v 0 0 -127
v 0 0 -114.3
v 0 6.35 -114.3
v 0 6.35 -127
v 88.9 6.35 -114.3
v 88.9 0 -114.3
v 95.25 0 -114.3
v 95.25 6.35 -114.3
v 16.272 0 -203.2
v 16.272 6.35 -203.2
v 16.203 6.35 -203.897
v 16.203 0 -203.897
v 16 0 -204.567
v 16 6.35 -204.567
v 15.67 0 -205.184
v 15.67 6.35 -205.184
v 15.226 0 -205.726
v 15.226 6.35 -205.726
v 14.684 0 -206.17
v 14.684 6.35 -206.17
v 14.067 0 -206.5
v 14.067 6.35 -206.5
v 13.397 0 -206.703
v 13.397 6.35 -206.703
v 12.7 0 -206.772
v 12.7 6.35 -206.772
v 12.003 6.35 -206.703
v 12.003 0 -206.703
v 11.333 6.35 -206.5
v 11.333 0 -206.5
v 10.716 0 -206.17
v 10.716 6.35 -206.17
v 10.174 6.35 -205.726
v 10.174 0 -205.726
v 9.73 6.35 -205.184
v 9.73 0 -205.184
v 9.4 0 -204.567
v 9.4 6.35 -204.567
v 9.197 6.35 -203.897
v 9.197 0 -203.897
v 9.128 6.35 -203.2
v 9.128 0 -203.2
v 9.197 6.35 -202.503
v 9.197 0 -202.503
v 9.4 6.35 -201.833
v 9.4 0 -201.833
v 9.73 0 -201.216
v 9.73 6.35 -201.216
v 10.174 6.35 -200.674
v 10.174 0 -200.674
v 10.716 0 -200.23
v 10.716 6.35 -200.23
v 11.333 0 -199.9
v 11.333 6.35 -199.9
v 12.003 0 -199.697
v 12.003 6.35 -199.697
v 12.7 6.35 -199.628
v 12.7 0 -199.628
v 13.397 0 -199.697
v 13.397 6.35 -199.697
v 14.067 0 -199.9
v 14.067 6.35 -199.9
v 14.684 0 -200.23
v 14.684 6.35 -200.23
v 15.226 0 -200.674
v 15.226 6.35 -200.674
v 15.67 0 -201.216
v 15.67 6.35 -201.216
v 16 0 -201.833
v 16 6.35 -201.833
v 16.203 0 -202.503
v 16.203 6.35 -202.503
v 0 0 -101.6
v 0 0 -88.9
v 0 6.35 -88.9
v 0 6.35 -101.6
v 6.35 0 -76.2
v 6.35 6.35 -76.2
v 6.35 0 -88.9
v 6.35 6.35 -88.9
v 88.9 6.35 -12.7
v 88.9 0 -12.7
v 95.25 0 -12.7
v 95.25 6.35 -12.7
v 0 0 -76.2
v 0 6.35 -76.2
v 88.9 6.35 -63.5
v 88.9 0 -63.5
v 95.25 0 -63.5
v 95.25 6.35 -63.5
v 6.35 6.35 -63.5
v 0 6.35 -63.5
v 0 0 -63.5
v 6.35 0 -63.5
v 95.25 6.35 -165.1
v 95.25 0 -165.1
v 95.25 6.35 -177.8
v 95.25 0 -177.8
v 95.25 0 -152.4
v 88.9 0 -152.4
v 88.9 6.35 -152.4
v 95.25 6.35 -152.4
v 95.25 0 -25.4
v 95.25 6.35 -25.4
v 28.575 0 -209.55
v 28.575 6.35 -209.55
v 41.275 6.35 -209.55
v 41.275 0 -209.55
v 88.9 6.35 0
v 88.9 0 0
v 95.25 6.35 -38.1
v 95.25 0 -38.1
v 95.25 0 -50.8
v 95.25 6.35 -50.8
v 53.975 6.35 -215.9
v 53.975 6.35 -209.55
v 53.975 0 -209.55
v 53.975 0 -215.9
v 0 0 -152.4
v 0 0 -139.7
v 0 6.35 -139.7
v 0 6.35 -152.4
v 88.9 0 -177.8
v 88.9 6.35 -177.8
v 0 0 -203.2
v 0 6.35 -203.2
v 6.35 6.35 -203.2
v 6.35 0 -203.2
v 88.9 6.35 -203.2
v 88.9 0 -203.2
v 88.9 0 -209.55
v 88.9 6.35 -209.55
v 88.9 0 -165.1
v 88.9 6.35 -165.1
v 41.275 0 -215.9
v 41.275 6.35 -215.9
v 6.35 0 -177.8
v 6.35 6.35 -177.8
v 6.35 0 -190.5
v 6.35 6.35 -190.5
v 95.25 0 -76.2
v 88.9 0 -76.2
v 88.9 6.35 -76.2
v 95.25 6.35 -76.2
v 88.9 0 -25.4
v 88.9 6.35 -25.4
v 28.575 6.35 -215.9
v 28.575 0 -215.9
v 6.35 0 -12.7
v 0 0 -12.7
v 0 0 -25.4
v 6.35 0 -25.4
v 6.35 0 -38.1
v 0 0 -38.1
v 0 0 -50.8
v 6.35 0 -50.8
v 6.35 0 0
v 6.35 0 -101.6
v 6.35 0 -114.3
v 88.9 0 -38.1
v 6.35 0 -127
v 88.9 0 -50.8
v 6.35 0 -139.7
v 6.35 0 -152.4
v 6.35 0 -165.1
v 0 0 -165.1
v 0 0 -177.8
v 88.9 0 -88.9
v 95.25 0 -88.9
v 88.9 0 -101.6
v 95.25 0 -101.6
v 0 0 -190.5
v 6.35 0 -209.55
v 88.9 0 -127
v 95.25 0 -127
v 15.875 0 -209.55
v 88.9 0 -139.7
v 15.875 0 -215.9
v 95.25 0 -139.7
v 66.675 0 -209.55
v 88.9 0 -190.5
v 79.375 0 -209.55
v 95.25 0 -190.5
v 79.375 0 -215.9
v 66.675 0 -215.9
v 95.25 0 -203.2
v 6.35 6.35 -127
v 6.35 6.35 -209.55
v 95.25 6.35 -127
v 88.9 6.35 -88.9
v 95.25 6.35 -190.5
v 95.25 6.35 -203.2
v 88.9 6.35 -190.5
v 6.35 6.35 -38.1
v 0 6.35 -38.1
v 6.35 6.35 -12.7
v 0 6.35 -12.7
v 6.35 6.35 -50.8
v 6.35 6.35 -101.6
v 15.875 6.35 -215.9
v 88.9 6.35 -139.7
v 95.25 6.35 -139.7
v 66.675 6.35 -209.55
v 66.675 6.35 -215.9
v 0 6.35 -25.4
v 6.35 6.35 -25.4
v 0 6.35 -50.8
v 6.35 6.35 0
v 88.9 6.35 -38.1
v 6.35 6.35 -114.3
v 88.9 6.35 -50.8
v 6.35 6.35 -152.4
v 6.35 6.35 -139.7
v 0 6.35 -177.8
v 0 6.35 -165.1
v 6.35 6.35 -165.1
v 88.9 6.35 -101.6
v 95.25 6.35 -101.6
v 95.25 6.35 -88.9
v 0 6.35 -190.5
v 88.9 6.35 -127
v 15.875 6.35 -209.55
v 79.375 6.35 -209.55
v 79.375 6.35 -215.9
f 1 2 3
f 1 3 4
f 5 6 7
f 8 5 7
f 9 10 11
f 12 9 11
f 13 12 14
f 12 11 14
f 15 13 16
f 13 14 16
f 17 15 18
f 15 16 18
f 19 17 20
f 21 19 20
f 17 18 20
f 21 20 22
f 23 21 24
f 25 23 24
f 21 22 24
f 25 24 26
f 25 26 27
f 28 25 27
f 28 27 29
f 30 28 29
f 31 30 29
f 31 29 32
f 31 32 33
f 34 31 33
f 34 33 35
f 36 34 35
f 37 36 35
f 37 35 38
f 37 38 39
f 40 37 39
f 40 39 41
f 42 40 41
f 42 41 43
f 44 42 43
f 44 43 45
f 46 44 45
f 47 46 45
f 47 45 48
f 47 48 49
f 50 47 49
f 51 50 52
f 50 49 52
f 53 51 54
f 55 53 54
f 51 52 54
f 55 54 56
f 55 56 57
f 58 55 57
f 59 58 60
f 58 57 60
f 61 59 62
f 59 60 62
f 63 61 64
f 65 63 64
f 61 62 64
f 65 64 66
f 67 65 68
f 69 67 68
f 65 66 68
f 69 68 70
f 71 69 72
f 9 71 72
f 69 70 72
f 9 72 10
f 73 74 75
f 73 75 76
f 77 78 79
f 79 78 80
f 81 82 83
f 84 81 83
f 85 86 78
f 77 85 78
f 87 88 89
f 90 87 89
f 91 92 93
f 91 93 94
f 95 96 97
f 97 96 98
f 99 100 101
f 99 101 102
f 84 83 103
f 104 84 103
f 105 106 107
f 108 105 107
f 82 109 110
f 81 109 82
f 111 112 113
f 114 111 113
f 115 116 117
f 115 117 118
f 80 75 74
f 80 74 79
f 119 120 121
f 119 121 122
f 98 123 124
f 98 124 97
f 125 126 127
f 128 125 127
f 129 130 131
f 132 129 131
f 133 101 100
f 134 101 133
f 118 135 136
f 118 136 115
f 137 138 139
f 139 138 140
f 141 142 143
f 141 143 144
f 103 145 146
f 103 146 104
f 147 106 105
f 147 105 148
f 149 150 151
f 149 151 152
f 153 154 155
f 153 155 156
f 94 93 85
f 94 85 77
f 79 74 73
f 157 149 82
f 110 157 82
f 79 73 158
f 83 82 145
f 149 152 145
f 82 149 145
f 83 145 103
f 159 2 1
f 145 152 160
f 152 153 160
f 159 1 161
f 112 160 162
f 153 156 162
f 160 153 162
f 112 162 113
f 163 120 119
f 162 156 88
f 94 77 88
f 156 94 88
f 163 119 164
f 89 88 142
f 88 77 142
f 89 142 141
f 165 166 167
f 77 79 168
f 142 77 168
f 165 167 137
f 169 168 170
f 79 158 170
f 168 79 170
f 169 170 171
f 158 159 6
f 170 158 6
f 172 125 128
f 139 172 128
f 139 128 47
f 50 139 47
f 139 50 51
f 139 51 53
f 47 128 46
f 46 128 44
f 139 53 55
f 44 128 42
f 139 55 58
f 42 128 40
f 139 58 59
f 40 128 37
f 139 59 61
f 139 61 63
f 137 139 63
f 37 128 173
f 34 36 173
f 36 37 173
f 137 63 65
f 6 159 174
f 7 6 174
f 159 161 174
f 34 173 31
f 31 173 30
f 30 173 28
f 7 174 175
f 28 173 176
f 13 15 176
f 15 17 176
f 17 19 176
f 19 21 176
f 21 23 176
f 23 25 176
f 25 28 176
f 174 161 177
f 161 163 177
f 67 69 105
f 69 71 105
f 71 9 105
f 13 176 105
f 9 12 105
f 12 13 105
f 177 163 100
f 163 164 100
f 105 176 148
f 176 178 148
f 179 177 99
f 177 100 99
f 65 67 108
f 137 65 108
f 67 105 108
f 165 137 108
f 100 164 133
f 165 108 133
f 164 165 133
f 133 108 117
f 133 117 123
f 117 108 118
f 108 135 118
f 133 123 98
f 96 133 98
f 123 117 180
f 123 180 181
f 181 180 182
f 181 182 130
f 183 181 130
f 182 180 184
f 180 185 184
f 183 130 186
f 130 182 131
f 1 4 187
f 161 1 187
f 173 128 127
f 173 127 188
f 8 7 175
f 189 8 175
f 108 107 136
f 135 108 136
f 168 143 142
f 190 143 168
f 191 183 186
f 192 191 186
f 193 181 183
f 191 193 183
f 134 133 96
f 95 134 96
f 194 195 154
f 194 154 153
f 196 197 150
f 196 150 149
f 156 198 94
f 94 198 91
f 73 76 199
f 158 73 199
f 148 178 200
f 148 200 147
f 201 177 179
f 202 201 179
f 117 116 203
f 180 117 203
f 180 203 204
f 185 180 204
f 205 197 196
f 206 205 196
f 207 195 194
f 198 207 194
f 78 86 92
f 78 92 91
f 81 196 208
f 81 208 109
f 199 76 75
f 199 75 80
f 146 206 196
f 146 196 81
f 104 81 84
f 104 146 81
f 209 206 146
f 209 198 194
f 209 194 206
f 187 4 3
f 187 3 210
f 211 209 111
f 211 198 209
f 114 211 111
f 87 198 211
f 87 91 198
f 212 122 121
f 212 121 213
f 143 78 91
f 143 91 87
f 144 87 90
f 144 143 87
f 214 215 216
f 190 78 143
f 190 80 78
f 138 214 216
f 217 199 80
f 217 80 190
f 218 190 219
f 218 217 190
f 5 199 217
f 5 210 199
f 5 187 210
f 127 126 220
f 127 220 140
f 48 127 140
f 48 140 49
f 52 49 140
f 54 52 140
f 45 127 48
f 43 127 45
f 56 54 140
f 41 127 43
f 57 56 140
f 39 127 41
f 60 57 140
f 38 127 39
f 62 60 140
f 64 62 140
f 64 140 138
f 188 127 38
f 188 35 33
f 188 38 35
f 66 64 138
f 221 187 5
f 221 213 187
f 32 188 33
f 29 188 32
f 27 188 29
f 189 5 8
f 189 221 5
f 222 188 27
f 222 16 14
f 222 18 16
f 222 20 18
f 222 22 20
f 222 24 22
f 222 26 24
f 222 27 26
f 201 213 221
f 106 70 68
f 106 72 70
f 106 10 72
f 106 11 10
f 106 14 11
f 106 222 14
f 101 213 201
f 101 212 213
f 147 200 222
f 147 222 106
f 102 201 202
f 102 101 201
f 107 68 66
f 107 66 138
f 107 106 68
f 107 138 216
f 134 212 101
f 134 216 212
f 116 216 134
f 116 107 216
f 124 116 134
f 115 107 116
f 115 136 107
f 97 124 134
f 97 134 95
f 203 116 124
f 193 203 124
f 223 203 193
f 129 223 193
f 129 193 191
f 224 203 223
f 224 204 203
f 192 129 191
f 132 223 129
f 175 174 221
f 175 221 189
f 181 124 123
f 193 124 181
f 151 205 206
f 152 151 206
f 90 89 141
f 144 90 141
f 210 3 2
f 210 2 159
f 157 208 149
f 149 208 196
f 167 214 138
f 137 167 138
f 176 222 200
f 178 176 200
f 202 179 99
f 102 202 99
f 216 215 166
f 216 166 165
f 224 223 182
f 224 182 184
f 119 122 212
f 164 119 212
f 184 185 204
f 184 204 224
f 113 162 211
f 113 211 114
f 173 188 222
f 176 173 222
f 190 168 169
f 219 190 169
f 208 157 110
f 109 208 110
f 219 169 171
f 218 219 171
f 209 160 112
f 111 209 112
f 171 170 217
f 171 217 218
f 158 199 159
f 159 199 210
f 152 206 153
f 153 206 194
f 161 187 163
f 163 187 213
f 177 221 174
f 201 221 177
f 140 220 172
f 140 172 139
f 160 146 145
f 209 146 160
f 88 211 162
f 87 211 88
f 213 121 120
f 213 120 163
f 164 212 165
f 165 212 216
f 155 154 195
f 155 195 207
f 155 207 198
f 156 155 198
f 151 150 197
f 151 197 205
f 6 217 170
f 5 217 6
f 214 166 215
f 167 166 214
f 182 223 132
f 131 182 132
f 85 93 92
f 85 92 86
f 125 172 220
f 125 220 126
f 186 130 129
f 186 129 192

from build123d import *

# Parameters (mm, degrees)
SKETCH1_W           = 95.25
SKETCH1_H           = 215.9
BOSS_EXTRUDE1_DEPTH = 6.35
SKETCH2_W           = 6.35
SKETCH2_H           = 12.7
CUT_EXTRUDE1_DEPTH  = 7.35
LPATTERN1_COUNT     = 10
LPATTERN1_PITCH     = 25.4
SKETCH3_W           = 12.7
SKETCH3_H           = 6.35
CUT_EXTRUDE2_DEPTH  = 7.35
LPATTERN2_COUNT     = 2
LPATTERN2_PITCH     = 25.4
LPATTERN2_COL_COUNT = 3
LPATTERN2_COL_PITCH = 25.4
SKETCH4_R           = 3.571875
CUT_EXTRUDE3_DEPTH  = 7.35


with BuildPart() as part:
    # Sketch1 → Boss-Extrude1 (new body)
    with BuildSketch(Plane(origin=(0, 0, 0), x_dir=(1, 0, 0), z_dir=(0, 1, 0))):
        with Locations((47.625, 107.95)):
            Rectangle(SKETCH1_W, SKETCH1_H)
    extrude(amount=BOSS_EXTRUDE1_DEPTH)

    # Sketch2 → Cut-Extrude1 (cut, through all)
    with BuildSketch(Plane(origin=(0, 6.35, 0), x_dir=(1, 0, 0), z_dir=(0, 1, 0))):
        with Locations((3.175, 209.55)):
            Rectangle(SKETCH2_W, SKETCH2_H)
        with Locations((92.075, 209.55)):
            Rectangle(SKETCH2_W, SKETCH2_H)
    cut_extrude1 = extrude(amount=-CUT_EXTRUDE1_DEPTH, mode=Mode.SUBTRACT)

    # LPattern1: Cut-Extrude1 ×10
    with Locations(*[(0, 0, i * LPATTERN1_PITCH) for i in range(1, LPATTERN1_COUNT)]):
        add(cut_extrude1, mode=Mode.SUBTRACT)

    # Sketch3 → Cut-Extrude2 (cut, through all)
    with BuildSketch(Plane(origin=(0, 6.35, 0), x_dir=(1, 0, 0), z_dir=(0, 1, 0))):
        with Locations((34.925, 212.725)):
            Rectangle(SKETCH3_W, SKETCH3_H)
    cut_extrude2 = extrude(amount=-CUT_EXTRUDE2_DEPTH, mode=Mode.SUBTRACT)

    # LPattern2: Cut-Extrude2 ×2
    with Locations(*[(-i * LPATTERN2_PITCH, 0, 0) for i in range(1, LPATTERN2_COUNT)]):
        add(cut_extrude2, mode=Mode.SUBTRACT)

    # LPattern2 col: Cut-Extrude2 ×3
    with Locations(*[(i * LPATTERN2_COL_PITCH, 0, 0) for i in range(1, LPATTERN2_COL_COUNT)]):
        add(cut_extrude2, mode=Mode.SUBTRACT)

    # Sketch4 → Cut-Extrude3 (cut, through all)
    with BuildSketch(Plane(origin=(0, 6.35, 0), x_dir=(1, 0, 0), z_dir=(0, 1, 0))):
        with Locations((12.7, 203.2)):
            Circle(SKETCH4_R)
    extrude(amount=-CUT_EXTRUDE3_DEPTH, mode=Mode.SUBTRACT)


solid = part.part
